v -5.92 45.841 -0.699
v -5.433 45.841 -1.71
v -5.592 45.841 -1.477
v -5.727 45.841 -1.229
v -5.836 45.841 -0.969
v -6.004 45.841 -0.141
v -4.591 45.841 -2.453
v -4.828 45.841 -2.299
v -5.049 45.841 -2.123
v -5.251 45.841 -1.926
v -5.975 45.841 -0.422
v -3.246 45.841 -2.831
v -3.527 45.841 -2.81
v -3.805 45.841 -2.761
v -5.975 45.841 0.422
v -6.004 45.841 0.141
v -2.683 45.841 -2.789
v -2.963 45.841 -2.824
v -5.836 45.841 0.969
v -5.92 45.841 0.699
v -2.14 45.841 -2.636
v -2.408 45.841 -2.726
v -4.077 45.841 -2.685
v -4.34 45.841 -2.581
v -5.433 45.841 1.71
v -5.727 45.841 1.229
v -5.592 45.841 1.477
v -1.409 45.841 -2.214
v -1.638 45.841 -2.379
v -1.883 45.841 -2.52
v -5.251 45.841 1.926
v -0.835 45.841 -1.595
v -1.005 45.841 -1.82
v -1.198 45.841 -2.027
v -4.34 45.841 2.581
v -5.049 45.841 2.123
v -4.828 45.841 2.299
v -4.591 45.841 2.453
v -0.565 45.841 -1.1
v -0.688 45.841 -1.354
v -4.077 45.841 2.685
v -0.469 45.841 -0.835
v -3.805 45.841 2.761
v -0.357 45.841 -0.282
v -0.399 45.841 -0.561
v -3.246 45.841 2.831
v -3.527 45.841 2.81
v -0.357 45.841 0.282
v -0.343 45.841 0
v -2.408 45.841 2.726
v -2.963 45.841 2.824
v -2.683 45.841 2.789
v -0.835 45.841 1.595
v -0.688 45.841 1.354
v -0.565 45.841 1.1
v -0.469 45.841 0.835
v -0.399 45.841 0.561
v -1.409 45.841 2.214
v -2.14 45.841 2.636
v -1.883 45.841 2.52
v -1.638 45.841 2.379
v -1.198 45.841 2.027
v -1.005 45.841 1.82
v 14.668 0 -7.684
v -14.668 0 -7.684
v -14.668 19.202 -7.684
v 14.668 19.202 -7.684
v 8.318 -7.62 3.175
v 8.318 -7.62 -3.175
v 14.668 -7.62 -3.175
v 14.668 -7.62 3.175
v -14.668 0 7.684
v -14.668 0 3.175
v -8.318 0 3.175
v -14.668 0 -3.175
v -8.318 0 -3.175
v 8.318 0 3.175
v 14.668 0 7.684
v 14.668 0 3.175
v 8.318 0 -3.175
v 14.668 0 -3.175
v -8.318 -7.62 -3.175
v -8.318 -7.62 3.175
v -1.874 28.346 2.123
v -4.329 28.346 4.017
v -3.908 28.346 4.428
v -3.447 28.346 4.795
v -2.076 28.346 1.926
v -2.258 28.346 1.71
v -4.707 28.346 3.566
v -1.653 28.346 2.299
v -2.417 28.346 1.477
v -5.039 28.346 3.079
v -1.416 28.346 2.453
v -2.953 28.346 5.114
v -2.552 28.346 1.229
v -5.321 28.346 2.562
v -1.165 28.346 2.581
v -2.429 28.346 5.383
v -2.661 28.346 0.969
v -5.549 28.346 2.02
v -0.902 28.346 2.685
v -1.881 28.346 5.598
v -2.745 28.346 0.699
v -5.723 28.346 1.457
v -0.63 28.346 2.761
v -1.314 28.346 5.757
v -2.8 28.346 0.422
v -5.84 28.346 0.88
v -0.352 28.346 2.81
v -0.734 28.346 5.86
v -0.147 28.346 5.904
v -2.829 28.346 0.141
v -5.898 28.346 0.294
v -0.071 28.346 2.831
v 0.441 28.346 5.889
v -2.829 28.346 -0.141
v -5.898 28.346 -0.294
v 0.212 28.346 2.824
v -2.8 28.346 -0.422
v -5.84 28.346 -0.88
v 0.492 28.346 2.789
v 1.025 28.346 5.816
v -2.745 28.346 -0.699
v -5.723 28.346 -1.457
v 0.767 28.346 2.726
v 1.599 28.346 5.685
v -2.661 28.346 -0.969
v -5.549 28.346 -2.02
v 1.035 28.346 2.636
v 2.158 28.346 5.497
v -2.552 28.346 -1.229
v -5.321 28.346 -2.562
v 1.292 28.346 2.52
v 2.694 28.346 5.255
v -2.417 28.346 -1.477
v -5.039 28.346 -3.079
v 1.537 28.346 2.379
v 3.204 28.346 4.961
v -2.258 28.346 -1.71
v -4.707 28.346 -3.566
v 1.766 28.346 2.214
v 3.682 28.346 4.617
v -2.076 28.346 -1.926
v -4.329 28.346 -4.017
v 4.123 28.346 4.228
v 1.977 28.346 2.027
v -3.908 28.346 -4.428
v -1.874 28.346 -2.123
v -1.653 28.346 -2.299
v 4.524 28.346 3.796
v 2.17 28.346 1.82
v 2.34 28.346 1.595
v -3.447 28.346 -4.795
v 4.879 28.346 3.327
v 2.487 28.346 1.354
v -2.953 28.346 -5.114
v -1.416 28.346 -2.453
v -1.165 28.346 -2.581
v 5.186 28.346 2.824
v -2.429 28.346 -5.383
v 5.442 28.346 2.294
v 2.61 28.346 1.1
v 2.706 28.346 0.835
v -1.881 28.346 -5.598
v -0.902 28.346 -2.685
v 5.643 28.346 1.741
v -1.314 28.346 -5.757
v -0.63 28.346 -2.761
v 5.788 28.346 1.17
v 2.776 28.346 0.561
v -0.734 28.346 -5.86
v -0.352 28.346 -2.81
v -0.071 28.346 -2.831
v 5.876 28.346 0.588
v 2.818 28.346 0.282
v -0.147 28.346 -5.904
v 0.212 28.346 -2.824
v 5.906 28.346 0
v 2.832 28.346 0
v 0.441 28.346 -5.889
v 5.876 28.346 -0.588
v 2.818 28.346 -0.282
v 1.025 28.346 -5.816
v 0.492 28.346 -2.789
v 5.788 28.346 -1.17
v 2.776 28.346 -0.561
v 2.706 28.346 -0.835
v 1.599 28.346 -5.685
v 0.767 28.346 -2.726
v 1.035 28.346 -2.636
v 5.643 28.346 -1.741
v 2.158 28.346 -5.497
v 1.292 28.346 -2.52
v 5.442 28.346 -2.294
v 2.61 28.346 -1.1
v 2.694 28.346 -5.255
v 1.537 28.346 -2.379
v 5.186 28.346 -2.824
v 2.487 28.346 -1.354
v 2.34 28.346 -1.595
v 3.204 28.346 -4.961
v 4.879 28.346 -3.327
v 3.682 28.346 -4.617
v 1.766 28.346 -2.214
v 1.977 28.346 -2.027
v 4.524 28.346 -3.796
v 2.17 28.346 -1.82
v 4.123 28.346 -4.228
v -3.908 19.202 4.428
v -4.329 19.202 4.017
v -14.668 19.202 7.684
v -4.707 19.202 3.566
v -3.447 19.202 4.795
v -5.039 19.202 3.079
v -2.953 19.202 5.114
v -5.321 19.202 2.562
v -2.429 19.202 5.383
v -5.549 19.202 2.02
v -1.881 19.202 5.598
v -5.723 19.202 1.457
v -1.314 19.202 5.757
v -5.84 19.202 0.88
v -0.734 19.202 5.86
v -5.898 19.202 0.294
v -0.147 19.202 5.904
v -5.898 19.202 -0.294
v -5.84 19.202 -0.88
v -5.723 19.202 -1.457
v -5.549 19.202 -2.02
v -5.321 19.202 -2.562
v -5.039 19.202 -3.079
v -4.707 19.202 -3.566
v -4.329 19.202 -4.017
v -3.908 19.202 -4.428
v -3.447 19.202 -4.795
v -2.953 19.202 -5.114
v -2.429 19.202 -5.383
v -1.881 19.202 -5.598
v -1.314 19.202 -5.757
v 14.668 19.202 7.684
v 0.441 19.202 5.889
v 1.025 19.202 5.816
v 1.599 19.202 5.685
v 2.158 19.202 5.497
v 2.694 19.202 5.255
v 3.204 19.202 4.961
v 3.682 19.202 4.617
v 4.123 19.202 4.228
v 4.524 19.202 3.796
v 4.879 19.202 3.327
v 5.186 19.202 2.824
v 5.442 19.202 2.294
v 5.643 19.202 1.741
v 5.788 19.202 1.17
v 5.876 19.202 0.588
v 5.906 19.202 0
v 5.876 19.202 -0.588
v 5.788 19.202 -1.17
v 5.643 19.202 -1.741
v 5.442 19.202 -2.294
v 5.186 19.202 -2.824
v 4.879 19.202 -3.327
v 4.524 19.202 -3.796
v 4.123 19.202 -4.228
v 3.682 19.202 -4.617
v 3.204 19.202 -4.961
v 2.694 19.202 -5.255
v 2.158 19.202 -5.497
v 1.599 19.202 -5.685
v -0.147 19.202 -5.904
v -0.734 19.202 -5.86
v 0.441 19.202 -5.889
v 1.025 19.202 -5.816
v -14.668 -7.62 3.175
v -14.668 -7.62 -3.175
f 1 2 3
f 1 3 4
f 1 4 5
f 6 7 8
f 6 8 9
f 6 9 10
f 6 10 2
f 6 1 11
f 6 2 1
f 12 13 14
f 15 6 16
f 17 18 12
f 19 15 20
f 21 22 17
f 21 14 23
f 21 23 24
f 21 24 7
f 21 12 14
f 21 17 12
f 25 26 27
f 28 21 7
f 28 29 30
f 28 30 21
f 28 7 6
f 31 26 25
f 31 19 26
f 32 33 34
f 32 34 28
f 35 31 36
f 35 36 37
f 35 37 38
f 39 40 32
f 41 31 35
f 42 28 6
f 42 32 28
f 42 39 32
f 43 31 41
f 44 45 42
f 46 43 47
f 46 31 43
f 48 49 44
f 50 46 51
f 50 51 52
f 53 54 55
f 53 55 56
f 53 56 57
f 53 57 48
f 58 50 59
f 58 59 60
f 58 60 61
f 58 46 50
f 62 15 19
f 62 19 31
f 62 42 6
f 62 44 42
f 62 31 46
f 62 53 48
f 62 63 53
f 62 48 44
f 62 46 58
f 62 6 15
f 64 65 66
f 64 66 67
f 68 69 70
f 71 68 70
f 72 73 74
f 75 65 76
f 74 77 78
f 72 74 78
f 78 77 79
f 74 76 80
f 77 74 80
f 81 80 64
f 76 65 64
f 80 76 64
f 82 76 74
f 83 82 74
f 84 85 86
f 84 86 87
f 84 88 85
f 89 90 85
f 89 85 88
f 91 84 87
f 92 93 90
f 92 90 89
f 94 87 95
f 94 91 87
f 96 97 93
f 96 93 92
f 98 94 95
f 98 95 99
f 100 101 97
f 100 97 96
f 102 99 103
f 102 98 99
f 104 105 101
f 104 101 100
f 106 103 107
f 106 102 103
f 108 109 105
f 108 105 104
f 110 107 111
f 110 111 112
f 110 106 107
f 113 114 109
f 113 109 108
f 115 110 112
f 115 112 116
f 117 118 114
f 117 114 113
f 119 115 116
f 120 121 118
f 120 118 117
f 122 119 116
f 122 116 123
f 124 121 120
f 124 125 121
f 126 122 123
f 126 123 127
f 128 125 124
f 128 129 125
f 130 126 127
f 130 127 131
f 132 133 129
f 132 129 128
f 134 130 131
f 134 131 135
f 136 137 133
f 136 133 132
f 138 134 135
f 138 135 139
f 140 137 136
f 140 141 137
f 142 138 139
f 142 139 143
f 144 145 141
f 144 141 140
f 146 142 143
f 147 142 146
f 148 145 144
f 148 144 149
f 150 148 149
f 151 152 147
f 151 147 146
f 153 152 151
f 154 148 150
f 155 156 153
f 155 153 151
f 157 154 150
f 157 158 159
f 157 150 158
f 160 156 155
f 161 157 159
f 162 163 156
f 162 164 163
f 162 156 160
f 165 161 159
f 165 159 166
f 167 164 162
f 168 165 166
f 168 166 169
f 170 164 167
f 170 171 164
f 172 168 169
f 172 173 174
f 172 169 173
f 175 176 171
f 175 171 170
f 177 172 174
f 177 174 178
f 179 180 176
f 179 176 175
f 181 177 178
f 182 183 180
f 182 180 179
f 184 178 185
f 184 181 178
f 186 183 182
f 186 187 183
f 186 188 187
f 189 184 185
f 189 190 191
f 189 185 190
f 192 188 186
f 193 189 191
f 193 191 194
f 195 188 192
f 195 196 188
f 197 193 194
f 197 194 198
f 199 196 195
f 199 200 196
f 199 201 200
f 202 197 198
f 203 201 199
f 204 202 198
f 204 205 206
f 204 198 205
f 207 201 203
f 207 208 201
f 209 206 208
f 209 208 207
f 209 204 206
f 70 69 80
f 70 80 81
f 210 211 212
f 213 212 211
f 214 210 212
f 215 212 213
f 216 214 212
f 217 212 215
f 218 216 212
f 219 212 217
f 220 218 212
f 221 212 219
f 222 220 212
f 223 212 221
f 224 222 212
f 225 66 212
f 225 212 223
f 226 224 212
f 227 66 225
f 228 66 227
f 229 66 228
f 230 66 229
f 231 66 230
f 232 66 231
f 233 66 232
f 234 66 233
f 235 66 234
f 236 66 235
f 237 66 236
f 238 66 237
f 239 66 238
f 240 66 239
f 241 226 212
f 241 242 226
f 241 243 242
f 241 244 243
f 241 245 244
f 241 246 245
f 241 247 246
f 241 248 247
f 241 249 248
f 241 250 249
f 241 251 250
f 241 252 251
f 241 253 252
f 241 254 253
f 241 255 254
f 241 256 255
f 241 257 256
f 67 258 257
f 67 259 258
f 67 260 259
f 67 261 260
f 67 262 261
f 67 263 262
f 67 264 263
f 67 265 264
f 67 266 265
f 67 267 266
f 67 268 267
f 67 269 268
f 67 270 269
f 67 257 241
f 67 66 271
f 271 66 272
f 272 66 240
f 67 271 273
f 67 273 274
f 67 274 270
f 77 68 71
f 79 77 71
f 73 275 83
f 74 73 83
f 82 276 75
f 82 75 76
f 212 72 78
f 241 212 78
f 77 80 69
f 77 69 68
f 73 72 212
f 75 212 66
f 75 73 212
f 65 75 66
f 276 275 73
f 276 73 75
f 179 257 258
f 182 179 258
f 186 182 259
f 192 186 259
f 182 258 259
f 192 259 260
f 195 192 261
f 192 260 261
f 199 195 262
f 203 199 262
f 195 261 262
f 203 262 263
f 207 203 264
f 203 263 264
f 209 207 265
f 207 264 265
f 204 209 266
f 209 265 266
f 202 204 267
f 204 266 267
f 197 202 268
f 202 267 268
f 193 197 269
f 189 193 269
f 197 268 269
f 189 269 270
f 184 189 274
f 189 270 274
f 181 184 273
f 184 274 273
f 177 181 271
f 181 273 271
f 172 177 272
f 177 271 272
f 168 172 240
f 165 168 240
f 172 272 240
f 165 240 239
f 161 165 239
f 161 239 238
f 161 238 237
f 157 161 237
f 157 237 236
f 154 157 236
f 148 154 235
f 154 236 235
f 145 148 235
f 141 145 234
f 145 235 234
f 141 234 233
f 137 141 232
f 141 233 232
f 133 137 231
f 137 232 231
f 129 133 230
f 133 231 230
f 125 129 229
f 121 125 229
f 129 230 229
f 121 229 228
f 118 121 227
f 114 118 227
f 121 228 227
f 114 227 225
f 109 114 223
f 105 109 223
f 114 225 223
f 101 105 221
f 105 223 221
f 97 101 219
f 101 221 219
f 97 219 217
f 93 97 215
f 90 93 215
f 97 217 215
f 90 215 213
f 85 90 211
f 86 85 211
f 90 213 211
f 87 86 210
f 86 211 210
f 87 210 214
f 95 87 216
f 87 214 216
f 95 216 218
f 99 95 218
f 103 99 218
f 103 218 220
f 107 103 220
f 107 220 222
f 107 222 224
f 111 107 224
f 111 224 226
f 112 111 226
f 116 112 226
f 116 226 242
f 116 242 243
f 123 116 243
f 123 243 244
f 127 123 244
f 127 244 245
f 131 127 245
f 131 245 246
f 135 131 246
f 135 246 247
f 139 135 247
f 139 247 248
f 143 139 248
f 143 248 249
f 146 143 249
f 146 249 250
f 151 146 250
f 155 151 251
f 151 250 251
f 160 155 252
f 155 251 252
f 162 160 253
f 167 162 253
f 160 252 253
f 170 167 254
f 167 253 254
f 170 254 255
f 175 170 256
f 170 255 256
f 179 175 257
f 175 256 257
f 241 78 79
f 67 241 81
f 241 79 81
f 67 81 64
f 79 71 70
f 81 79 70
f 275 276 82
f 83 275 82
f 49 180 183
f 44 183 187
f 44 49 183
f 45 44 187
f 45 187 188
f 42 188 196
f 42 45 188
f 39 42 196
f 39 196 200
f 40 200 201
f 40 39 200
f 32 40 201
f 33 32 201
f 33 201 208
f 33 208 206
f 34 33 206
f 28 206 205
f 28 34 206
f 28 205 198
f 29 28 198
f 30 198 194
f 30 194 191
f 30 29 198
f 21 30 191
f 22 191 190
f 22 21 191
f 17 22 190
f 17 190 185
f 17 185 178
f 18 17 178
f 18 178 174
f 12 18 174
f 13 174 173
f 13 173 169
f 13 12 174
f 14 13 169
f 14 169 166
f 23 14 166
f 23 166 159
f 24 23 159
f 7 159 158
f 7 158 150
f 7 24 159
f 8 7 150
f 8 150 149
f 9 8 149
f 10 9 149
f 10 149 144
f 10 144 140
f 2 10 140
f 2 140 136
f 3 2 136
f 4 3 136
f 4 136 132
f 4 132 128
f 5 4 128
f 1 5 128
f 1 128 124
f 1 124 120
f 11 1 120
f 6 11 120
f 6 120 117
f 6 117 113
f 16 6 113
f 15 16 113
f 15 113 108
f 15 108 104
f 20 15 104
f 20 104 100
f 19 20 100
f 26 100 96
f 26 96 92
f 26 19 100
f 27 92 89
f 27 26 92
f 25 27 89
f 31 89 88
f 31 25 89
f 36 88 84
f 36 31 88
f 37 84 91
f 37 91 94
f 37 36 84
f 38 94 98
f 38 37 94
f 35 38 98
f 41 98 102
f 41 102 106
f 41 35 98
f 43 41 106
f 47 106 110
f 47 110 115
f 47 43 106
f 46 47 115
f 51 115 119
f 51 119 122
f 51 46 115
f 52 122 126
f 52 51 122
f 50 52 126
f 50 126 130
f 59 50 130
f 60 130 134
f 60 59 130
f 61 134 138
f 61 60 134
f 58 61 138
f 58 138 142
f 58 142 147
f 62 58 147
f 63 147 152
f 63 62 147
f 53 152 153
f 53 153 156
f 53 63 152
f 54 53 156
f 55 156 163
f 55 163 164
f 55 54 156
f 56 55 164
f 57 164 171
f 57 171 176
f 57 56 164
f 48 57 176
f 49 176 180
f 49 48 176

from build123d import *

# Parameters (mm, degrees)
SKETCH1_W           = 29.337
SKETCH1_H           = 15.367
BOSS_EXTRUDE1_DEPTH = 19.2024
SKETCH2_R           = 5.9055
BOSS_EXTRUDE2_DEPTH = 9.144
SKETCH3_W           = 6.35
SKETCH3_H           = 6.35
BOSS_EXTRUDE3_DEPTH = 7.62
SKETCH4_R           = 2.8321


with BuildPart() as part:
    # Sketch1 → Boss-Extrude1 (new body)
    with BuildSketch(Plane(origin=(0, 0, 0), x_dir=(1, 0, 0), z_dir=(0, 1, 0))):
        Rectangle(SKETCH1_W, SKETCH1_H)
    extrude(amount=BOSS_EXTRUDE1_DEPTH)

    # Sketch2 → Boss-Extrude2 (add)
    with BuildSketch(Plane(origin=(0, 19.2024, 0), x_dir=(1, 0, 0), z_dir=(0, 1, 0))):
        Circle(SKETCH2_R)
    extrude(amount=BOSS_EXTRUDE2_DEPTH)

    # Sketch3 → Boss-Extrude3 (add)
    with BuildSketch(Plane.XZ):
        with Locations((-11.4935, 0)):
            Rectangle(SKETCH3_W, SKETCH3_H)
        with Locations((11.4935, 0)):
            Rectangle(SKETCH3_W, SKETCH3_H)
    extrude(amount=BOSS_EXTRUDE3_DEPTH)

    # Sweep1: sweep along a path in Sketch5
    with BuildLine(Plane.XY) as sweep1_path:
        Line((0, 28.3464), (-3.175, 45.840621189))
    # Sketch4 → Sweep1 (sweep)
    with BuildSketch(Plane(origin=(0, 28.3464, 0), x_dir=(1, 0, 0), z_dir=(0, 1, 0))):
        Circle(SKETCH4_R)
    sweep(path=sweep1_path.line)


solid = part.part
